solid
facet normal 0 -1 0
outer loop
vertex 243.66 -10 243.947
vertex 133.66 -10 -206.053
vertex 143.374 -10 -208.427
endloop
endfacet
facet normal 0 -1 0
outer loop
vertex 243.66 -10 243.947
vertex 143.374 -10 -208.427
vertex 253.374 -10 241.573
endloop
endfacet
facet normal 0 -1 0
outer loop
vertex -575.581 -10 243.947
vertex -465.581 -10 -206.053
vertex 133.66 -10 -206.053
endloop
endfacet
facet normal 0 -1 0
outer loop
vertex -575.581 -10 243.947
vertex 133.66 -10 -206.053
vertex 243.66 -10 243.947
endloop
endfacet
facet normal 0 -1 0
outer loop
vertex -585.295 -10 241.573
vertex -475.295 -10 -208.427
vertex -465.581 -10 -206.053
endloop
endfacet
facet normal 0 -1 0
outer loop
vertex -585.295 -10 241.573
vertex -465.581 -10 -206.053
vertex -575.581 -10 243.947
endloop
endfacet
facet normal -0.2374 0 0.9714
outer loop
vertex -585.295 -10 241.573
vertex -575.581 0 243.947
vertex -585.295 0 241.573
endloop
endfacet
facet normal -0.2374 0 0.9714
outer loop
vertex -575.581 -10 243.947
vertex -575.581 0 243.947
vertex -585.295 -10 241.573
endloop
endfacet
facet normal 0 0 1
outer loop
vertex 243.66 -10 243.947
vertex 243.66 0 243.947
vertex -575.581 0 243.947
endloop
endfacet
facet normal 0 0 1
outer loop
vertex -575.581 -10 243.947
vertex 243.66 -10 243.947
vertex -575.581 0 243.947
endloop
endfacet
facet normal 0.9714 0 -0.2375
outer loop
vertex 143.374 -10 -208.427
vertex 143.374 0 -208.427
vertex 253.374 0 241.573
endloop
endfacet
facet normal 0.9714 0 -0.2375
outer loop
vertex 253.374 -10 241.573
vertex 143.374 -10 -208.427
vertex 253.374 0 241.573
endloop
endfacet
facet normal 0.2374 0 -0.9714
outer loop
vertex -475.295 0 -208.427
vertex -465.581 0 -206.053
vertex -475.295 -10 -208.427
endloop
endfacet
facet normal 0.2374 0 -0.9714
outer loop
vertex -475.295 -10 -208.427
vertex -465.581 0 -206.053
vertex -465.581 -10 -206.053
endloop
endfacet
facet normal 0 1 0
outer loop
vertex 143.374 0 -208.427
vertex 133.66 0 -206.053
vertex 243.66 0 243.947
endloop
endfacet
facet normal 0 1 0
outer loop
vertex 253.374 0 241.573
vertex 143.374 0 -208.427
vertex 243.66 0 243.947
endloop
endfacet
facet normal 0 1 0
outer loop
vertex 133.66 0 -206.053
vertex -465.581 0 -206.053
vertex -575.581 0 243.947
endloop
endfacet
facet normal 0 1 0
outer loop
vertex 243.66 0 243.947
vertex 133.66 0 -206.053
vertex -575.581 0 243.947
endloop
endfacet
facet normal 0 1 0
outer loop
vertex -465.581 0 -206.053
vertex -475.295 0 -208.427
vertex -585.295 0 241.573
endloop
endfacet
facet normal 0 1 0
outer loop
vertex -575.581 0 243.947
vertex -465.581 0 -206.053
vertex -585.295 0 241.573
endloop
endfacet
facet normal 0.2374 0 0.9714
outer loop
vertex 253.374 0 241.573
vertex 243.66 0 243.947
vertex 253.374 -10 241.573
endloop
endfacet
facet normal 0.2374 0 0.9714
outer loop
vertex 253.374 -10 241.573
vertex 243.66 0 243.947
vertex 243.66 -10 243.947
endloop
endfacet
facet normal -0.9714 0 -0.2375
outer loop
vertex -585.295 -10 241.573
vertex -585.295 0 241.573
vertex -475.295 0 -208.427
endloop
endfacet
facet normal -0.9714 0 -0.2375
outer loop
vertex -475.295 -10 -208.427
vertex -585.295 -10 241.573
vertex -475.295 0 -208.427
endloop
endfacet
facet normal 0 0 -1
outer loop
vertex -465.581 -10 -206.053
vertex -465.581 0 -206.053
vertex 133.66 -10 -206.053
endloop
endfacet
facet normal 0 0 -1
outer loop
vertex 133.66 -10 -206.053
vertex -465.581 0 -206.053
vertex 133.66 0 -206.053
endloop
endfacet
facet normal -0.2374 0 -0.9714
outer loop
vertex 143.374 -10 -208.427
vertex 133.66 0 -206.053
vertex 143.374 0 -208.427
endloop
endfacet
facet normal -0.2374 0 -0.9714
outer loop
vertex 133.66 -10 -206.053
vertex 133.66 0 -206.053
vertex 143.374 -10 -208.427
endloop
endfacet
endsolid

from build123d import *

# Parameters (mm, degrees)
F0_W     = 540
F0_H     = 390
F1_DEPTH = 10
F2_W     = 80
F2_H     = 80
F2_R     = 15
F3_DEPTH = 10
F4_R     = 15
F5_DEPTH = 10
F6_DEPTH = 10
F7_DEPTH = 10


with BuildPart() as f1:
    # F0 (on Front) → F1 (new body)
    with BuildSketch(Plane.XZ):
        Polygon((-575.5810141563, 243.9473703504), (-465.5810141563, -206.0526296496), (133.660423523, -206.0526296496), (243.660423523, 243.9473703504), (133.660423523, 243.9473703504), (-465.5810141563, 243.9473703504), align=None)
        with Locations((-166.339576477, 18.9473703504)):
            Rectangle(F0_W, F0_H, mode=Mode.SUBTRACT)
        Polygon((-495.5810141563, 43.0153865893), (-537.3643879646, 213.9473703504), (-495.5810141563, 213.9473703504), align=None, mode=Mode.SUBTRACT)
        Polygon((163.660423523, 213.9473703504), (205.4437973313, 213.9473703504), (163.660423523, 43.0153865893), align=None, mode=Mode.SUBTRACT)
    extrude(amount=F1_DEPTH)

    # F2 (on face) → F3 (join)
    with BuildSketch(Plane.XZ.offset(10)):
        with Locations((-396.339576477, 173.9473703504)):
            Rectangle(F2_W, F2_H)
        with Locations((-396.339576477, 198.8157841563)):
            Circle(F2_R, mode=Mode.SUBTRACT)
        with Locations((63.660423523, 173.9473703504)):
            Rectangle(F2_W, F2_H)
        with Locations((63.660423523, 198.8157841563)):
            Circle(F2_R, mode=Mode.SUBTRACT)
        with Locations((63.660423523, -136.0526296496)):
            Rectangle(F2_W, F2_H)
        with Locations((63.660423523, -136.0526296496)):
            Circle(F2_R, mode=Mode.SUBTRACT)
        with Locations((-396.339576477, -136.0526296496)):
            Rectangle(F2_W, F2_H)
        with Locations((-396.339576477, -136.0526296496)):
            Circle(F2_R, mode=Mode.SUBTRACT)
    extrude(amount=-F3_DEPTH)

    # F4 (on face) → F5 (join)
    with BuildSketch(Plane.XZ.offset(10)):
        Polygon((243.660423523, 243.9473703504), (-575.5810141563, 243.9473703504), (-465.5810141563, -206.0526296496), (133.660423523, -206.0526296496), align=None)
        with Locations((-396.339576477, -136.0526296496)):
            Circle(F4_R, mode=Mode.SUBTRACT)
        Polygon((23.660423523, -96.0526296496), (23.660423523, -176.0526296496), (-356.339576477, -176.0526296496), (-356.339576477, -96.0526296496), (-436.339576477, -96.0526296496), (-436.339576477, 133.9473703504), (-356.339576477, 133.9473703504), (-356.339576477, 213.9473703504), (23.660423523, 213.9473703504), (23.660423523, 133.9473703504), (103.660423523, 133.9473703504), (103.660423523, -96.0526296496), align=None, mode=Mode.SUBTRACT)
        with Locations((63.660423523, -136.0526296496)):
            Circle(F4_R, mode=Mode.SUBTRACT)
        Polygon((-495.5810141563, 213.9473703504), (-495.5810141563, 43.0153865893), (-537.3643879646, 213.9473703504), align=None, mode=Mode.SUBTRACT)
        with Locations((-396.339576477, 198.8157841563)):
            Circle(F4_R, mode=Mode.SUBTRACT)
        Polygon((163.660423523, 43.0153865893), (163.660423523, 213.9473703504), (205.4437973313, 213.9473703504), align=None, mode=Mode.SUBTRACT)
        with Locations((63.660423523, 198.8157841563)):
            Circle(F4_R, mode=Mode.SUBTRACT)
        Polygon((-356.339576477, -176.0526296496), (23.660423523, -176.0526296496), (23.660423523, -96.0526296496), (103.660423523, -96.0526296496), (103.660423523, 133.9473703504), (23.660423523, 133.9473703504), (23.660423523, 213.9473703504), (-356.339576477, 213.9473703504), (-356.339576477, 133.9473703504), (-436.339576477, 133.9473703504), (-436.339576477, -96.0526296496), (-356.339576477, -96.0526296496), align=None)
        Polygon((-537.3643879646, 213.9473703504), (-495.5810141563, 43.0153865893), (-495.5810141563, 213.9473703504), align=None)
        Polygon((205.4437973313, 213.9473703504), (163.660423523, 213.9473703504), (163.660423523, 43.0153865893), align=None)
        with Locations((63.660423523, 198.8157841563)):
            Circle(F4_R)
        with Locations((-396.339576477, 198.8157841563)):
            Circle(F4_R)
        with Locations((-396.339576477, -136.0526296496)):
            Circle(F4_R)
        with Locations((63.660423523, -136.0526296496)):
            Circle(F4_R)
    extrude(amount=-F5_DEPTH)

    # F6 (add): a face of the model
    f6_faces = [f1.faces().sort_by_distance(p)[0] for p in [
        (-520.5810141563, -5, 18.9473703504),
    ]]
    extrude(f6_faces, amount=F6_DEPTH)

    # F7 (add): a face of the model
    f7_faces = [f1.faces().sort_by_distance(p)[0] for p in [
        (188.660423523, -5, 18.9473703504),
    ]]
    extrude(f7_faces, amount=F7_DEPTH)


solid = f1.part
